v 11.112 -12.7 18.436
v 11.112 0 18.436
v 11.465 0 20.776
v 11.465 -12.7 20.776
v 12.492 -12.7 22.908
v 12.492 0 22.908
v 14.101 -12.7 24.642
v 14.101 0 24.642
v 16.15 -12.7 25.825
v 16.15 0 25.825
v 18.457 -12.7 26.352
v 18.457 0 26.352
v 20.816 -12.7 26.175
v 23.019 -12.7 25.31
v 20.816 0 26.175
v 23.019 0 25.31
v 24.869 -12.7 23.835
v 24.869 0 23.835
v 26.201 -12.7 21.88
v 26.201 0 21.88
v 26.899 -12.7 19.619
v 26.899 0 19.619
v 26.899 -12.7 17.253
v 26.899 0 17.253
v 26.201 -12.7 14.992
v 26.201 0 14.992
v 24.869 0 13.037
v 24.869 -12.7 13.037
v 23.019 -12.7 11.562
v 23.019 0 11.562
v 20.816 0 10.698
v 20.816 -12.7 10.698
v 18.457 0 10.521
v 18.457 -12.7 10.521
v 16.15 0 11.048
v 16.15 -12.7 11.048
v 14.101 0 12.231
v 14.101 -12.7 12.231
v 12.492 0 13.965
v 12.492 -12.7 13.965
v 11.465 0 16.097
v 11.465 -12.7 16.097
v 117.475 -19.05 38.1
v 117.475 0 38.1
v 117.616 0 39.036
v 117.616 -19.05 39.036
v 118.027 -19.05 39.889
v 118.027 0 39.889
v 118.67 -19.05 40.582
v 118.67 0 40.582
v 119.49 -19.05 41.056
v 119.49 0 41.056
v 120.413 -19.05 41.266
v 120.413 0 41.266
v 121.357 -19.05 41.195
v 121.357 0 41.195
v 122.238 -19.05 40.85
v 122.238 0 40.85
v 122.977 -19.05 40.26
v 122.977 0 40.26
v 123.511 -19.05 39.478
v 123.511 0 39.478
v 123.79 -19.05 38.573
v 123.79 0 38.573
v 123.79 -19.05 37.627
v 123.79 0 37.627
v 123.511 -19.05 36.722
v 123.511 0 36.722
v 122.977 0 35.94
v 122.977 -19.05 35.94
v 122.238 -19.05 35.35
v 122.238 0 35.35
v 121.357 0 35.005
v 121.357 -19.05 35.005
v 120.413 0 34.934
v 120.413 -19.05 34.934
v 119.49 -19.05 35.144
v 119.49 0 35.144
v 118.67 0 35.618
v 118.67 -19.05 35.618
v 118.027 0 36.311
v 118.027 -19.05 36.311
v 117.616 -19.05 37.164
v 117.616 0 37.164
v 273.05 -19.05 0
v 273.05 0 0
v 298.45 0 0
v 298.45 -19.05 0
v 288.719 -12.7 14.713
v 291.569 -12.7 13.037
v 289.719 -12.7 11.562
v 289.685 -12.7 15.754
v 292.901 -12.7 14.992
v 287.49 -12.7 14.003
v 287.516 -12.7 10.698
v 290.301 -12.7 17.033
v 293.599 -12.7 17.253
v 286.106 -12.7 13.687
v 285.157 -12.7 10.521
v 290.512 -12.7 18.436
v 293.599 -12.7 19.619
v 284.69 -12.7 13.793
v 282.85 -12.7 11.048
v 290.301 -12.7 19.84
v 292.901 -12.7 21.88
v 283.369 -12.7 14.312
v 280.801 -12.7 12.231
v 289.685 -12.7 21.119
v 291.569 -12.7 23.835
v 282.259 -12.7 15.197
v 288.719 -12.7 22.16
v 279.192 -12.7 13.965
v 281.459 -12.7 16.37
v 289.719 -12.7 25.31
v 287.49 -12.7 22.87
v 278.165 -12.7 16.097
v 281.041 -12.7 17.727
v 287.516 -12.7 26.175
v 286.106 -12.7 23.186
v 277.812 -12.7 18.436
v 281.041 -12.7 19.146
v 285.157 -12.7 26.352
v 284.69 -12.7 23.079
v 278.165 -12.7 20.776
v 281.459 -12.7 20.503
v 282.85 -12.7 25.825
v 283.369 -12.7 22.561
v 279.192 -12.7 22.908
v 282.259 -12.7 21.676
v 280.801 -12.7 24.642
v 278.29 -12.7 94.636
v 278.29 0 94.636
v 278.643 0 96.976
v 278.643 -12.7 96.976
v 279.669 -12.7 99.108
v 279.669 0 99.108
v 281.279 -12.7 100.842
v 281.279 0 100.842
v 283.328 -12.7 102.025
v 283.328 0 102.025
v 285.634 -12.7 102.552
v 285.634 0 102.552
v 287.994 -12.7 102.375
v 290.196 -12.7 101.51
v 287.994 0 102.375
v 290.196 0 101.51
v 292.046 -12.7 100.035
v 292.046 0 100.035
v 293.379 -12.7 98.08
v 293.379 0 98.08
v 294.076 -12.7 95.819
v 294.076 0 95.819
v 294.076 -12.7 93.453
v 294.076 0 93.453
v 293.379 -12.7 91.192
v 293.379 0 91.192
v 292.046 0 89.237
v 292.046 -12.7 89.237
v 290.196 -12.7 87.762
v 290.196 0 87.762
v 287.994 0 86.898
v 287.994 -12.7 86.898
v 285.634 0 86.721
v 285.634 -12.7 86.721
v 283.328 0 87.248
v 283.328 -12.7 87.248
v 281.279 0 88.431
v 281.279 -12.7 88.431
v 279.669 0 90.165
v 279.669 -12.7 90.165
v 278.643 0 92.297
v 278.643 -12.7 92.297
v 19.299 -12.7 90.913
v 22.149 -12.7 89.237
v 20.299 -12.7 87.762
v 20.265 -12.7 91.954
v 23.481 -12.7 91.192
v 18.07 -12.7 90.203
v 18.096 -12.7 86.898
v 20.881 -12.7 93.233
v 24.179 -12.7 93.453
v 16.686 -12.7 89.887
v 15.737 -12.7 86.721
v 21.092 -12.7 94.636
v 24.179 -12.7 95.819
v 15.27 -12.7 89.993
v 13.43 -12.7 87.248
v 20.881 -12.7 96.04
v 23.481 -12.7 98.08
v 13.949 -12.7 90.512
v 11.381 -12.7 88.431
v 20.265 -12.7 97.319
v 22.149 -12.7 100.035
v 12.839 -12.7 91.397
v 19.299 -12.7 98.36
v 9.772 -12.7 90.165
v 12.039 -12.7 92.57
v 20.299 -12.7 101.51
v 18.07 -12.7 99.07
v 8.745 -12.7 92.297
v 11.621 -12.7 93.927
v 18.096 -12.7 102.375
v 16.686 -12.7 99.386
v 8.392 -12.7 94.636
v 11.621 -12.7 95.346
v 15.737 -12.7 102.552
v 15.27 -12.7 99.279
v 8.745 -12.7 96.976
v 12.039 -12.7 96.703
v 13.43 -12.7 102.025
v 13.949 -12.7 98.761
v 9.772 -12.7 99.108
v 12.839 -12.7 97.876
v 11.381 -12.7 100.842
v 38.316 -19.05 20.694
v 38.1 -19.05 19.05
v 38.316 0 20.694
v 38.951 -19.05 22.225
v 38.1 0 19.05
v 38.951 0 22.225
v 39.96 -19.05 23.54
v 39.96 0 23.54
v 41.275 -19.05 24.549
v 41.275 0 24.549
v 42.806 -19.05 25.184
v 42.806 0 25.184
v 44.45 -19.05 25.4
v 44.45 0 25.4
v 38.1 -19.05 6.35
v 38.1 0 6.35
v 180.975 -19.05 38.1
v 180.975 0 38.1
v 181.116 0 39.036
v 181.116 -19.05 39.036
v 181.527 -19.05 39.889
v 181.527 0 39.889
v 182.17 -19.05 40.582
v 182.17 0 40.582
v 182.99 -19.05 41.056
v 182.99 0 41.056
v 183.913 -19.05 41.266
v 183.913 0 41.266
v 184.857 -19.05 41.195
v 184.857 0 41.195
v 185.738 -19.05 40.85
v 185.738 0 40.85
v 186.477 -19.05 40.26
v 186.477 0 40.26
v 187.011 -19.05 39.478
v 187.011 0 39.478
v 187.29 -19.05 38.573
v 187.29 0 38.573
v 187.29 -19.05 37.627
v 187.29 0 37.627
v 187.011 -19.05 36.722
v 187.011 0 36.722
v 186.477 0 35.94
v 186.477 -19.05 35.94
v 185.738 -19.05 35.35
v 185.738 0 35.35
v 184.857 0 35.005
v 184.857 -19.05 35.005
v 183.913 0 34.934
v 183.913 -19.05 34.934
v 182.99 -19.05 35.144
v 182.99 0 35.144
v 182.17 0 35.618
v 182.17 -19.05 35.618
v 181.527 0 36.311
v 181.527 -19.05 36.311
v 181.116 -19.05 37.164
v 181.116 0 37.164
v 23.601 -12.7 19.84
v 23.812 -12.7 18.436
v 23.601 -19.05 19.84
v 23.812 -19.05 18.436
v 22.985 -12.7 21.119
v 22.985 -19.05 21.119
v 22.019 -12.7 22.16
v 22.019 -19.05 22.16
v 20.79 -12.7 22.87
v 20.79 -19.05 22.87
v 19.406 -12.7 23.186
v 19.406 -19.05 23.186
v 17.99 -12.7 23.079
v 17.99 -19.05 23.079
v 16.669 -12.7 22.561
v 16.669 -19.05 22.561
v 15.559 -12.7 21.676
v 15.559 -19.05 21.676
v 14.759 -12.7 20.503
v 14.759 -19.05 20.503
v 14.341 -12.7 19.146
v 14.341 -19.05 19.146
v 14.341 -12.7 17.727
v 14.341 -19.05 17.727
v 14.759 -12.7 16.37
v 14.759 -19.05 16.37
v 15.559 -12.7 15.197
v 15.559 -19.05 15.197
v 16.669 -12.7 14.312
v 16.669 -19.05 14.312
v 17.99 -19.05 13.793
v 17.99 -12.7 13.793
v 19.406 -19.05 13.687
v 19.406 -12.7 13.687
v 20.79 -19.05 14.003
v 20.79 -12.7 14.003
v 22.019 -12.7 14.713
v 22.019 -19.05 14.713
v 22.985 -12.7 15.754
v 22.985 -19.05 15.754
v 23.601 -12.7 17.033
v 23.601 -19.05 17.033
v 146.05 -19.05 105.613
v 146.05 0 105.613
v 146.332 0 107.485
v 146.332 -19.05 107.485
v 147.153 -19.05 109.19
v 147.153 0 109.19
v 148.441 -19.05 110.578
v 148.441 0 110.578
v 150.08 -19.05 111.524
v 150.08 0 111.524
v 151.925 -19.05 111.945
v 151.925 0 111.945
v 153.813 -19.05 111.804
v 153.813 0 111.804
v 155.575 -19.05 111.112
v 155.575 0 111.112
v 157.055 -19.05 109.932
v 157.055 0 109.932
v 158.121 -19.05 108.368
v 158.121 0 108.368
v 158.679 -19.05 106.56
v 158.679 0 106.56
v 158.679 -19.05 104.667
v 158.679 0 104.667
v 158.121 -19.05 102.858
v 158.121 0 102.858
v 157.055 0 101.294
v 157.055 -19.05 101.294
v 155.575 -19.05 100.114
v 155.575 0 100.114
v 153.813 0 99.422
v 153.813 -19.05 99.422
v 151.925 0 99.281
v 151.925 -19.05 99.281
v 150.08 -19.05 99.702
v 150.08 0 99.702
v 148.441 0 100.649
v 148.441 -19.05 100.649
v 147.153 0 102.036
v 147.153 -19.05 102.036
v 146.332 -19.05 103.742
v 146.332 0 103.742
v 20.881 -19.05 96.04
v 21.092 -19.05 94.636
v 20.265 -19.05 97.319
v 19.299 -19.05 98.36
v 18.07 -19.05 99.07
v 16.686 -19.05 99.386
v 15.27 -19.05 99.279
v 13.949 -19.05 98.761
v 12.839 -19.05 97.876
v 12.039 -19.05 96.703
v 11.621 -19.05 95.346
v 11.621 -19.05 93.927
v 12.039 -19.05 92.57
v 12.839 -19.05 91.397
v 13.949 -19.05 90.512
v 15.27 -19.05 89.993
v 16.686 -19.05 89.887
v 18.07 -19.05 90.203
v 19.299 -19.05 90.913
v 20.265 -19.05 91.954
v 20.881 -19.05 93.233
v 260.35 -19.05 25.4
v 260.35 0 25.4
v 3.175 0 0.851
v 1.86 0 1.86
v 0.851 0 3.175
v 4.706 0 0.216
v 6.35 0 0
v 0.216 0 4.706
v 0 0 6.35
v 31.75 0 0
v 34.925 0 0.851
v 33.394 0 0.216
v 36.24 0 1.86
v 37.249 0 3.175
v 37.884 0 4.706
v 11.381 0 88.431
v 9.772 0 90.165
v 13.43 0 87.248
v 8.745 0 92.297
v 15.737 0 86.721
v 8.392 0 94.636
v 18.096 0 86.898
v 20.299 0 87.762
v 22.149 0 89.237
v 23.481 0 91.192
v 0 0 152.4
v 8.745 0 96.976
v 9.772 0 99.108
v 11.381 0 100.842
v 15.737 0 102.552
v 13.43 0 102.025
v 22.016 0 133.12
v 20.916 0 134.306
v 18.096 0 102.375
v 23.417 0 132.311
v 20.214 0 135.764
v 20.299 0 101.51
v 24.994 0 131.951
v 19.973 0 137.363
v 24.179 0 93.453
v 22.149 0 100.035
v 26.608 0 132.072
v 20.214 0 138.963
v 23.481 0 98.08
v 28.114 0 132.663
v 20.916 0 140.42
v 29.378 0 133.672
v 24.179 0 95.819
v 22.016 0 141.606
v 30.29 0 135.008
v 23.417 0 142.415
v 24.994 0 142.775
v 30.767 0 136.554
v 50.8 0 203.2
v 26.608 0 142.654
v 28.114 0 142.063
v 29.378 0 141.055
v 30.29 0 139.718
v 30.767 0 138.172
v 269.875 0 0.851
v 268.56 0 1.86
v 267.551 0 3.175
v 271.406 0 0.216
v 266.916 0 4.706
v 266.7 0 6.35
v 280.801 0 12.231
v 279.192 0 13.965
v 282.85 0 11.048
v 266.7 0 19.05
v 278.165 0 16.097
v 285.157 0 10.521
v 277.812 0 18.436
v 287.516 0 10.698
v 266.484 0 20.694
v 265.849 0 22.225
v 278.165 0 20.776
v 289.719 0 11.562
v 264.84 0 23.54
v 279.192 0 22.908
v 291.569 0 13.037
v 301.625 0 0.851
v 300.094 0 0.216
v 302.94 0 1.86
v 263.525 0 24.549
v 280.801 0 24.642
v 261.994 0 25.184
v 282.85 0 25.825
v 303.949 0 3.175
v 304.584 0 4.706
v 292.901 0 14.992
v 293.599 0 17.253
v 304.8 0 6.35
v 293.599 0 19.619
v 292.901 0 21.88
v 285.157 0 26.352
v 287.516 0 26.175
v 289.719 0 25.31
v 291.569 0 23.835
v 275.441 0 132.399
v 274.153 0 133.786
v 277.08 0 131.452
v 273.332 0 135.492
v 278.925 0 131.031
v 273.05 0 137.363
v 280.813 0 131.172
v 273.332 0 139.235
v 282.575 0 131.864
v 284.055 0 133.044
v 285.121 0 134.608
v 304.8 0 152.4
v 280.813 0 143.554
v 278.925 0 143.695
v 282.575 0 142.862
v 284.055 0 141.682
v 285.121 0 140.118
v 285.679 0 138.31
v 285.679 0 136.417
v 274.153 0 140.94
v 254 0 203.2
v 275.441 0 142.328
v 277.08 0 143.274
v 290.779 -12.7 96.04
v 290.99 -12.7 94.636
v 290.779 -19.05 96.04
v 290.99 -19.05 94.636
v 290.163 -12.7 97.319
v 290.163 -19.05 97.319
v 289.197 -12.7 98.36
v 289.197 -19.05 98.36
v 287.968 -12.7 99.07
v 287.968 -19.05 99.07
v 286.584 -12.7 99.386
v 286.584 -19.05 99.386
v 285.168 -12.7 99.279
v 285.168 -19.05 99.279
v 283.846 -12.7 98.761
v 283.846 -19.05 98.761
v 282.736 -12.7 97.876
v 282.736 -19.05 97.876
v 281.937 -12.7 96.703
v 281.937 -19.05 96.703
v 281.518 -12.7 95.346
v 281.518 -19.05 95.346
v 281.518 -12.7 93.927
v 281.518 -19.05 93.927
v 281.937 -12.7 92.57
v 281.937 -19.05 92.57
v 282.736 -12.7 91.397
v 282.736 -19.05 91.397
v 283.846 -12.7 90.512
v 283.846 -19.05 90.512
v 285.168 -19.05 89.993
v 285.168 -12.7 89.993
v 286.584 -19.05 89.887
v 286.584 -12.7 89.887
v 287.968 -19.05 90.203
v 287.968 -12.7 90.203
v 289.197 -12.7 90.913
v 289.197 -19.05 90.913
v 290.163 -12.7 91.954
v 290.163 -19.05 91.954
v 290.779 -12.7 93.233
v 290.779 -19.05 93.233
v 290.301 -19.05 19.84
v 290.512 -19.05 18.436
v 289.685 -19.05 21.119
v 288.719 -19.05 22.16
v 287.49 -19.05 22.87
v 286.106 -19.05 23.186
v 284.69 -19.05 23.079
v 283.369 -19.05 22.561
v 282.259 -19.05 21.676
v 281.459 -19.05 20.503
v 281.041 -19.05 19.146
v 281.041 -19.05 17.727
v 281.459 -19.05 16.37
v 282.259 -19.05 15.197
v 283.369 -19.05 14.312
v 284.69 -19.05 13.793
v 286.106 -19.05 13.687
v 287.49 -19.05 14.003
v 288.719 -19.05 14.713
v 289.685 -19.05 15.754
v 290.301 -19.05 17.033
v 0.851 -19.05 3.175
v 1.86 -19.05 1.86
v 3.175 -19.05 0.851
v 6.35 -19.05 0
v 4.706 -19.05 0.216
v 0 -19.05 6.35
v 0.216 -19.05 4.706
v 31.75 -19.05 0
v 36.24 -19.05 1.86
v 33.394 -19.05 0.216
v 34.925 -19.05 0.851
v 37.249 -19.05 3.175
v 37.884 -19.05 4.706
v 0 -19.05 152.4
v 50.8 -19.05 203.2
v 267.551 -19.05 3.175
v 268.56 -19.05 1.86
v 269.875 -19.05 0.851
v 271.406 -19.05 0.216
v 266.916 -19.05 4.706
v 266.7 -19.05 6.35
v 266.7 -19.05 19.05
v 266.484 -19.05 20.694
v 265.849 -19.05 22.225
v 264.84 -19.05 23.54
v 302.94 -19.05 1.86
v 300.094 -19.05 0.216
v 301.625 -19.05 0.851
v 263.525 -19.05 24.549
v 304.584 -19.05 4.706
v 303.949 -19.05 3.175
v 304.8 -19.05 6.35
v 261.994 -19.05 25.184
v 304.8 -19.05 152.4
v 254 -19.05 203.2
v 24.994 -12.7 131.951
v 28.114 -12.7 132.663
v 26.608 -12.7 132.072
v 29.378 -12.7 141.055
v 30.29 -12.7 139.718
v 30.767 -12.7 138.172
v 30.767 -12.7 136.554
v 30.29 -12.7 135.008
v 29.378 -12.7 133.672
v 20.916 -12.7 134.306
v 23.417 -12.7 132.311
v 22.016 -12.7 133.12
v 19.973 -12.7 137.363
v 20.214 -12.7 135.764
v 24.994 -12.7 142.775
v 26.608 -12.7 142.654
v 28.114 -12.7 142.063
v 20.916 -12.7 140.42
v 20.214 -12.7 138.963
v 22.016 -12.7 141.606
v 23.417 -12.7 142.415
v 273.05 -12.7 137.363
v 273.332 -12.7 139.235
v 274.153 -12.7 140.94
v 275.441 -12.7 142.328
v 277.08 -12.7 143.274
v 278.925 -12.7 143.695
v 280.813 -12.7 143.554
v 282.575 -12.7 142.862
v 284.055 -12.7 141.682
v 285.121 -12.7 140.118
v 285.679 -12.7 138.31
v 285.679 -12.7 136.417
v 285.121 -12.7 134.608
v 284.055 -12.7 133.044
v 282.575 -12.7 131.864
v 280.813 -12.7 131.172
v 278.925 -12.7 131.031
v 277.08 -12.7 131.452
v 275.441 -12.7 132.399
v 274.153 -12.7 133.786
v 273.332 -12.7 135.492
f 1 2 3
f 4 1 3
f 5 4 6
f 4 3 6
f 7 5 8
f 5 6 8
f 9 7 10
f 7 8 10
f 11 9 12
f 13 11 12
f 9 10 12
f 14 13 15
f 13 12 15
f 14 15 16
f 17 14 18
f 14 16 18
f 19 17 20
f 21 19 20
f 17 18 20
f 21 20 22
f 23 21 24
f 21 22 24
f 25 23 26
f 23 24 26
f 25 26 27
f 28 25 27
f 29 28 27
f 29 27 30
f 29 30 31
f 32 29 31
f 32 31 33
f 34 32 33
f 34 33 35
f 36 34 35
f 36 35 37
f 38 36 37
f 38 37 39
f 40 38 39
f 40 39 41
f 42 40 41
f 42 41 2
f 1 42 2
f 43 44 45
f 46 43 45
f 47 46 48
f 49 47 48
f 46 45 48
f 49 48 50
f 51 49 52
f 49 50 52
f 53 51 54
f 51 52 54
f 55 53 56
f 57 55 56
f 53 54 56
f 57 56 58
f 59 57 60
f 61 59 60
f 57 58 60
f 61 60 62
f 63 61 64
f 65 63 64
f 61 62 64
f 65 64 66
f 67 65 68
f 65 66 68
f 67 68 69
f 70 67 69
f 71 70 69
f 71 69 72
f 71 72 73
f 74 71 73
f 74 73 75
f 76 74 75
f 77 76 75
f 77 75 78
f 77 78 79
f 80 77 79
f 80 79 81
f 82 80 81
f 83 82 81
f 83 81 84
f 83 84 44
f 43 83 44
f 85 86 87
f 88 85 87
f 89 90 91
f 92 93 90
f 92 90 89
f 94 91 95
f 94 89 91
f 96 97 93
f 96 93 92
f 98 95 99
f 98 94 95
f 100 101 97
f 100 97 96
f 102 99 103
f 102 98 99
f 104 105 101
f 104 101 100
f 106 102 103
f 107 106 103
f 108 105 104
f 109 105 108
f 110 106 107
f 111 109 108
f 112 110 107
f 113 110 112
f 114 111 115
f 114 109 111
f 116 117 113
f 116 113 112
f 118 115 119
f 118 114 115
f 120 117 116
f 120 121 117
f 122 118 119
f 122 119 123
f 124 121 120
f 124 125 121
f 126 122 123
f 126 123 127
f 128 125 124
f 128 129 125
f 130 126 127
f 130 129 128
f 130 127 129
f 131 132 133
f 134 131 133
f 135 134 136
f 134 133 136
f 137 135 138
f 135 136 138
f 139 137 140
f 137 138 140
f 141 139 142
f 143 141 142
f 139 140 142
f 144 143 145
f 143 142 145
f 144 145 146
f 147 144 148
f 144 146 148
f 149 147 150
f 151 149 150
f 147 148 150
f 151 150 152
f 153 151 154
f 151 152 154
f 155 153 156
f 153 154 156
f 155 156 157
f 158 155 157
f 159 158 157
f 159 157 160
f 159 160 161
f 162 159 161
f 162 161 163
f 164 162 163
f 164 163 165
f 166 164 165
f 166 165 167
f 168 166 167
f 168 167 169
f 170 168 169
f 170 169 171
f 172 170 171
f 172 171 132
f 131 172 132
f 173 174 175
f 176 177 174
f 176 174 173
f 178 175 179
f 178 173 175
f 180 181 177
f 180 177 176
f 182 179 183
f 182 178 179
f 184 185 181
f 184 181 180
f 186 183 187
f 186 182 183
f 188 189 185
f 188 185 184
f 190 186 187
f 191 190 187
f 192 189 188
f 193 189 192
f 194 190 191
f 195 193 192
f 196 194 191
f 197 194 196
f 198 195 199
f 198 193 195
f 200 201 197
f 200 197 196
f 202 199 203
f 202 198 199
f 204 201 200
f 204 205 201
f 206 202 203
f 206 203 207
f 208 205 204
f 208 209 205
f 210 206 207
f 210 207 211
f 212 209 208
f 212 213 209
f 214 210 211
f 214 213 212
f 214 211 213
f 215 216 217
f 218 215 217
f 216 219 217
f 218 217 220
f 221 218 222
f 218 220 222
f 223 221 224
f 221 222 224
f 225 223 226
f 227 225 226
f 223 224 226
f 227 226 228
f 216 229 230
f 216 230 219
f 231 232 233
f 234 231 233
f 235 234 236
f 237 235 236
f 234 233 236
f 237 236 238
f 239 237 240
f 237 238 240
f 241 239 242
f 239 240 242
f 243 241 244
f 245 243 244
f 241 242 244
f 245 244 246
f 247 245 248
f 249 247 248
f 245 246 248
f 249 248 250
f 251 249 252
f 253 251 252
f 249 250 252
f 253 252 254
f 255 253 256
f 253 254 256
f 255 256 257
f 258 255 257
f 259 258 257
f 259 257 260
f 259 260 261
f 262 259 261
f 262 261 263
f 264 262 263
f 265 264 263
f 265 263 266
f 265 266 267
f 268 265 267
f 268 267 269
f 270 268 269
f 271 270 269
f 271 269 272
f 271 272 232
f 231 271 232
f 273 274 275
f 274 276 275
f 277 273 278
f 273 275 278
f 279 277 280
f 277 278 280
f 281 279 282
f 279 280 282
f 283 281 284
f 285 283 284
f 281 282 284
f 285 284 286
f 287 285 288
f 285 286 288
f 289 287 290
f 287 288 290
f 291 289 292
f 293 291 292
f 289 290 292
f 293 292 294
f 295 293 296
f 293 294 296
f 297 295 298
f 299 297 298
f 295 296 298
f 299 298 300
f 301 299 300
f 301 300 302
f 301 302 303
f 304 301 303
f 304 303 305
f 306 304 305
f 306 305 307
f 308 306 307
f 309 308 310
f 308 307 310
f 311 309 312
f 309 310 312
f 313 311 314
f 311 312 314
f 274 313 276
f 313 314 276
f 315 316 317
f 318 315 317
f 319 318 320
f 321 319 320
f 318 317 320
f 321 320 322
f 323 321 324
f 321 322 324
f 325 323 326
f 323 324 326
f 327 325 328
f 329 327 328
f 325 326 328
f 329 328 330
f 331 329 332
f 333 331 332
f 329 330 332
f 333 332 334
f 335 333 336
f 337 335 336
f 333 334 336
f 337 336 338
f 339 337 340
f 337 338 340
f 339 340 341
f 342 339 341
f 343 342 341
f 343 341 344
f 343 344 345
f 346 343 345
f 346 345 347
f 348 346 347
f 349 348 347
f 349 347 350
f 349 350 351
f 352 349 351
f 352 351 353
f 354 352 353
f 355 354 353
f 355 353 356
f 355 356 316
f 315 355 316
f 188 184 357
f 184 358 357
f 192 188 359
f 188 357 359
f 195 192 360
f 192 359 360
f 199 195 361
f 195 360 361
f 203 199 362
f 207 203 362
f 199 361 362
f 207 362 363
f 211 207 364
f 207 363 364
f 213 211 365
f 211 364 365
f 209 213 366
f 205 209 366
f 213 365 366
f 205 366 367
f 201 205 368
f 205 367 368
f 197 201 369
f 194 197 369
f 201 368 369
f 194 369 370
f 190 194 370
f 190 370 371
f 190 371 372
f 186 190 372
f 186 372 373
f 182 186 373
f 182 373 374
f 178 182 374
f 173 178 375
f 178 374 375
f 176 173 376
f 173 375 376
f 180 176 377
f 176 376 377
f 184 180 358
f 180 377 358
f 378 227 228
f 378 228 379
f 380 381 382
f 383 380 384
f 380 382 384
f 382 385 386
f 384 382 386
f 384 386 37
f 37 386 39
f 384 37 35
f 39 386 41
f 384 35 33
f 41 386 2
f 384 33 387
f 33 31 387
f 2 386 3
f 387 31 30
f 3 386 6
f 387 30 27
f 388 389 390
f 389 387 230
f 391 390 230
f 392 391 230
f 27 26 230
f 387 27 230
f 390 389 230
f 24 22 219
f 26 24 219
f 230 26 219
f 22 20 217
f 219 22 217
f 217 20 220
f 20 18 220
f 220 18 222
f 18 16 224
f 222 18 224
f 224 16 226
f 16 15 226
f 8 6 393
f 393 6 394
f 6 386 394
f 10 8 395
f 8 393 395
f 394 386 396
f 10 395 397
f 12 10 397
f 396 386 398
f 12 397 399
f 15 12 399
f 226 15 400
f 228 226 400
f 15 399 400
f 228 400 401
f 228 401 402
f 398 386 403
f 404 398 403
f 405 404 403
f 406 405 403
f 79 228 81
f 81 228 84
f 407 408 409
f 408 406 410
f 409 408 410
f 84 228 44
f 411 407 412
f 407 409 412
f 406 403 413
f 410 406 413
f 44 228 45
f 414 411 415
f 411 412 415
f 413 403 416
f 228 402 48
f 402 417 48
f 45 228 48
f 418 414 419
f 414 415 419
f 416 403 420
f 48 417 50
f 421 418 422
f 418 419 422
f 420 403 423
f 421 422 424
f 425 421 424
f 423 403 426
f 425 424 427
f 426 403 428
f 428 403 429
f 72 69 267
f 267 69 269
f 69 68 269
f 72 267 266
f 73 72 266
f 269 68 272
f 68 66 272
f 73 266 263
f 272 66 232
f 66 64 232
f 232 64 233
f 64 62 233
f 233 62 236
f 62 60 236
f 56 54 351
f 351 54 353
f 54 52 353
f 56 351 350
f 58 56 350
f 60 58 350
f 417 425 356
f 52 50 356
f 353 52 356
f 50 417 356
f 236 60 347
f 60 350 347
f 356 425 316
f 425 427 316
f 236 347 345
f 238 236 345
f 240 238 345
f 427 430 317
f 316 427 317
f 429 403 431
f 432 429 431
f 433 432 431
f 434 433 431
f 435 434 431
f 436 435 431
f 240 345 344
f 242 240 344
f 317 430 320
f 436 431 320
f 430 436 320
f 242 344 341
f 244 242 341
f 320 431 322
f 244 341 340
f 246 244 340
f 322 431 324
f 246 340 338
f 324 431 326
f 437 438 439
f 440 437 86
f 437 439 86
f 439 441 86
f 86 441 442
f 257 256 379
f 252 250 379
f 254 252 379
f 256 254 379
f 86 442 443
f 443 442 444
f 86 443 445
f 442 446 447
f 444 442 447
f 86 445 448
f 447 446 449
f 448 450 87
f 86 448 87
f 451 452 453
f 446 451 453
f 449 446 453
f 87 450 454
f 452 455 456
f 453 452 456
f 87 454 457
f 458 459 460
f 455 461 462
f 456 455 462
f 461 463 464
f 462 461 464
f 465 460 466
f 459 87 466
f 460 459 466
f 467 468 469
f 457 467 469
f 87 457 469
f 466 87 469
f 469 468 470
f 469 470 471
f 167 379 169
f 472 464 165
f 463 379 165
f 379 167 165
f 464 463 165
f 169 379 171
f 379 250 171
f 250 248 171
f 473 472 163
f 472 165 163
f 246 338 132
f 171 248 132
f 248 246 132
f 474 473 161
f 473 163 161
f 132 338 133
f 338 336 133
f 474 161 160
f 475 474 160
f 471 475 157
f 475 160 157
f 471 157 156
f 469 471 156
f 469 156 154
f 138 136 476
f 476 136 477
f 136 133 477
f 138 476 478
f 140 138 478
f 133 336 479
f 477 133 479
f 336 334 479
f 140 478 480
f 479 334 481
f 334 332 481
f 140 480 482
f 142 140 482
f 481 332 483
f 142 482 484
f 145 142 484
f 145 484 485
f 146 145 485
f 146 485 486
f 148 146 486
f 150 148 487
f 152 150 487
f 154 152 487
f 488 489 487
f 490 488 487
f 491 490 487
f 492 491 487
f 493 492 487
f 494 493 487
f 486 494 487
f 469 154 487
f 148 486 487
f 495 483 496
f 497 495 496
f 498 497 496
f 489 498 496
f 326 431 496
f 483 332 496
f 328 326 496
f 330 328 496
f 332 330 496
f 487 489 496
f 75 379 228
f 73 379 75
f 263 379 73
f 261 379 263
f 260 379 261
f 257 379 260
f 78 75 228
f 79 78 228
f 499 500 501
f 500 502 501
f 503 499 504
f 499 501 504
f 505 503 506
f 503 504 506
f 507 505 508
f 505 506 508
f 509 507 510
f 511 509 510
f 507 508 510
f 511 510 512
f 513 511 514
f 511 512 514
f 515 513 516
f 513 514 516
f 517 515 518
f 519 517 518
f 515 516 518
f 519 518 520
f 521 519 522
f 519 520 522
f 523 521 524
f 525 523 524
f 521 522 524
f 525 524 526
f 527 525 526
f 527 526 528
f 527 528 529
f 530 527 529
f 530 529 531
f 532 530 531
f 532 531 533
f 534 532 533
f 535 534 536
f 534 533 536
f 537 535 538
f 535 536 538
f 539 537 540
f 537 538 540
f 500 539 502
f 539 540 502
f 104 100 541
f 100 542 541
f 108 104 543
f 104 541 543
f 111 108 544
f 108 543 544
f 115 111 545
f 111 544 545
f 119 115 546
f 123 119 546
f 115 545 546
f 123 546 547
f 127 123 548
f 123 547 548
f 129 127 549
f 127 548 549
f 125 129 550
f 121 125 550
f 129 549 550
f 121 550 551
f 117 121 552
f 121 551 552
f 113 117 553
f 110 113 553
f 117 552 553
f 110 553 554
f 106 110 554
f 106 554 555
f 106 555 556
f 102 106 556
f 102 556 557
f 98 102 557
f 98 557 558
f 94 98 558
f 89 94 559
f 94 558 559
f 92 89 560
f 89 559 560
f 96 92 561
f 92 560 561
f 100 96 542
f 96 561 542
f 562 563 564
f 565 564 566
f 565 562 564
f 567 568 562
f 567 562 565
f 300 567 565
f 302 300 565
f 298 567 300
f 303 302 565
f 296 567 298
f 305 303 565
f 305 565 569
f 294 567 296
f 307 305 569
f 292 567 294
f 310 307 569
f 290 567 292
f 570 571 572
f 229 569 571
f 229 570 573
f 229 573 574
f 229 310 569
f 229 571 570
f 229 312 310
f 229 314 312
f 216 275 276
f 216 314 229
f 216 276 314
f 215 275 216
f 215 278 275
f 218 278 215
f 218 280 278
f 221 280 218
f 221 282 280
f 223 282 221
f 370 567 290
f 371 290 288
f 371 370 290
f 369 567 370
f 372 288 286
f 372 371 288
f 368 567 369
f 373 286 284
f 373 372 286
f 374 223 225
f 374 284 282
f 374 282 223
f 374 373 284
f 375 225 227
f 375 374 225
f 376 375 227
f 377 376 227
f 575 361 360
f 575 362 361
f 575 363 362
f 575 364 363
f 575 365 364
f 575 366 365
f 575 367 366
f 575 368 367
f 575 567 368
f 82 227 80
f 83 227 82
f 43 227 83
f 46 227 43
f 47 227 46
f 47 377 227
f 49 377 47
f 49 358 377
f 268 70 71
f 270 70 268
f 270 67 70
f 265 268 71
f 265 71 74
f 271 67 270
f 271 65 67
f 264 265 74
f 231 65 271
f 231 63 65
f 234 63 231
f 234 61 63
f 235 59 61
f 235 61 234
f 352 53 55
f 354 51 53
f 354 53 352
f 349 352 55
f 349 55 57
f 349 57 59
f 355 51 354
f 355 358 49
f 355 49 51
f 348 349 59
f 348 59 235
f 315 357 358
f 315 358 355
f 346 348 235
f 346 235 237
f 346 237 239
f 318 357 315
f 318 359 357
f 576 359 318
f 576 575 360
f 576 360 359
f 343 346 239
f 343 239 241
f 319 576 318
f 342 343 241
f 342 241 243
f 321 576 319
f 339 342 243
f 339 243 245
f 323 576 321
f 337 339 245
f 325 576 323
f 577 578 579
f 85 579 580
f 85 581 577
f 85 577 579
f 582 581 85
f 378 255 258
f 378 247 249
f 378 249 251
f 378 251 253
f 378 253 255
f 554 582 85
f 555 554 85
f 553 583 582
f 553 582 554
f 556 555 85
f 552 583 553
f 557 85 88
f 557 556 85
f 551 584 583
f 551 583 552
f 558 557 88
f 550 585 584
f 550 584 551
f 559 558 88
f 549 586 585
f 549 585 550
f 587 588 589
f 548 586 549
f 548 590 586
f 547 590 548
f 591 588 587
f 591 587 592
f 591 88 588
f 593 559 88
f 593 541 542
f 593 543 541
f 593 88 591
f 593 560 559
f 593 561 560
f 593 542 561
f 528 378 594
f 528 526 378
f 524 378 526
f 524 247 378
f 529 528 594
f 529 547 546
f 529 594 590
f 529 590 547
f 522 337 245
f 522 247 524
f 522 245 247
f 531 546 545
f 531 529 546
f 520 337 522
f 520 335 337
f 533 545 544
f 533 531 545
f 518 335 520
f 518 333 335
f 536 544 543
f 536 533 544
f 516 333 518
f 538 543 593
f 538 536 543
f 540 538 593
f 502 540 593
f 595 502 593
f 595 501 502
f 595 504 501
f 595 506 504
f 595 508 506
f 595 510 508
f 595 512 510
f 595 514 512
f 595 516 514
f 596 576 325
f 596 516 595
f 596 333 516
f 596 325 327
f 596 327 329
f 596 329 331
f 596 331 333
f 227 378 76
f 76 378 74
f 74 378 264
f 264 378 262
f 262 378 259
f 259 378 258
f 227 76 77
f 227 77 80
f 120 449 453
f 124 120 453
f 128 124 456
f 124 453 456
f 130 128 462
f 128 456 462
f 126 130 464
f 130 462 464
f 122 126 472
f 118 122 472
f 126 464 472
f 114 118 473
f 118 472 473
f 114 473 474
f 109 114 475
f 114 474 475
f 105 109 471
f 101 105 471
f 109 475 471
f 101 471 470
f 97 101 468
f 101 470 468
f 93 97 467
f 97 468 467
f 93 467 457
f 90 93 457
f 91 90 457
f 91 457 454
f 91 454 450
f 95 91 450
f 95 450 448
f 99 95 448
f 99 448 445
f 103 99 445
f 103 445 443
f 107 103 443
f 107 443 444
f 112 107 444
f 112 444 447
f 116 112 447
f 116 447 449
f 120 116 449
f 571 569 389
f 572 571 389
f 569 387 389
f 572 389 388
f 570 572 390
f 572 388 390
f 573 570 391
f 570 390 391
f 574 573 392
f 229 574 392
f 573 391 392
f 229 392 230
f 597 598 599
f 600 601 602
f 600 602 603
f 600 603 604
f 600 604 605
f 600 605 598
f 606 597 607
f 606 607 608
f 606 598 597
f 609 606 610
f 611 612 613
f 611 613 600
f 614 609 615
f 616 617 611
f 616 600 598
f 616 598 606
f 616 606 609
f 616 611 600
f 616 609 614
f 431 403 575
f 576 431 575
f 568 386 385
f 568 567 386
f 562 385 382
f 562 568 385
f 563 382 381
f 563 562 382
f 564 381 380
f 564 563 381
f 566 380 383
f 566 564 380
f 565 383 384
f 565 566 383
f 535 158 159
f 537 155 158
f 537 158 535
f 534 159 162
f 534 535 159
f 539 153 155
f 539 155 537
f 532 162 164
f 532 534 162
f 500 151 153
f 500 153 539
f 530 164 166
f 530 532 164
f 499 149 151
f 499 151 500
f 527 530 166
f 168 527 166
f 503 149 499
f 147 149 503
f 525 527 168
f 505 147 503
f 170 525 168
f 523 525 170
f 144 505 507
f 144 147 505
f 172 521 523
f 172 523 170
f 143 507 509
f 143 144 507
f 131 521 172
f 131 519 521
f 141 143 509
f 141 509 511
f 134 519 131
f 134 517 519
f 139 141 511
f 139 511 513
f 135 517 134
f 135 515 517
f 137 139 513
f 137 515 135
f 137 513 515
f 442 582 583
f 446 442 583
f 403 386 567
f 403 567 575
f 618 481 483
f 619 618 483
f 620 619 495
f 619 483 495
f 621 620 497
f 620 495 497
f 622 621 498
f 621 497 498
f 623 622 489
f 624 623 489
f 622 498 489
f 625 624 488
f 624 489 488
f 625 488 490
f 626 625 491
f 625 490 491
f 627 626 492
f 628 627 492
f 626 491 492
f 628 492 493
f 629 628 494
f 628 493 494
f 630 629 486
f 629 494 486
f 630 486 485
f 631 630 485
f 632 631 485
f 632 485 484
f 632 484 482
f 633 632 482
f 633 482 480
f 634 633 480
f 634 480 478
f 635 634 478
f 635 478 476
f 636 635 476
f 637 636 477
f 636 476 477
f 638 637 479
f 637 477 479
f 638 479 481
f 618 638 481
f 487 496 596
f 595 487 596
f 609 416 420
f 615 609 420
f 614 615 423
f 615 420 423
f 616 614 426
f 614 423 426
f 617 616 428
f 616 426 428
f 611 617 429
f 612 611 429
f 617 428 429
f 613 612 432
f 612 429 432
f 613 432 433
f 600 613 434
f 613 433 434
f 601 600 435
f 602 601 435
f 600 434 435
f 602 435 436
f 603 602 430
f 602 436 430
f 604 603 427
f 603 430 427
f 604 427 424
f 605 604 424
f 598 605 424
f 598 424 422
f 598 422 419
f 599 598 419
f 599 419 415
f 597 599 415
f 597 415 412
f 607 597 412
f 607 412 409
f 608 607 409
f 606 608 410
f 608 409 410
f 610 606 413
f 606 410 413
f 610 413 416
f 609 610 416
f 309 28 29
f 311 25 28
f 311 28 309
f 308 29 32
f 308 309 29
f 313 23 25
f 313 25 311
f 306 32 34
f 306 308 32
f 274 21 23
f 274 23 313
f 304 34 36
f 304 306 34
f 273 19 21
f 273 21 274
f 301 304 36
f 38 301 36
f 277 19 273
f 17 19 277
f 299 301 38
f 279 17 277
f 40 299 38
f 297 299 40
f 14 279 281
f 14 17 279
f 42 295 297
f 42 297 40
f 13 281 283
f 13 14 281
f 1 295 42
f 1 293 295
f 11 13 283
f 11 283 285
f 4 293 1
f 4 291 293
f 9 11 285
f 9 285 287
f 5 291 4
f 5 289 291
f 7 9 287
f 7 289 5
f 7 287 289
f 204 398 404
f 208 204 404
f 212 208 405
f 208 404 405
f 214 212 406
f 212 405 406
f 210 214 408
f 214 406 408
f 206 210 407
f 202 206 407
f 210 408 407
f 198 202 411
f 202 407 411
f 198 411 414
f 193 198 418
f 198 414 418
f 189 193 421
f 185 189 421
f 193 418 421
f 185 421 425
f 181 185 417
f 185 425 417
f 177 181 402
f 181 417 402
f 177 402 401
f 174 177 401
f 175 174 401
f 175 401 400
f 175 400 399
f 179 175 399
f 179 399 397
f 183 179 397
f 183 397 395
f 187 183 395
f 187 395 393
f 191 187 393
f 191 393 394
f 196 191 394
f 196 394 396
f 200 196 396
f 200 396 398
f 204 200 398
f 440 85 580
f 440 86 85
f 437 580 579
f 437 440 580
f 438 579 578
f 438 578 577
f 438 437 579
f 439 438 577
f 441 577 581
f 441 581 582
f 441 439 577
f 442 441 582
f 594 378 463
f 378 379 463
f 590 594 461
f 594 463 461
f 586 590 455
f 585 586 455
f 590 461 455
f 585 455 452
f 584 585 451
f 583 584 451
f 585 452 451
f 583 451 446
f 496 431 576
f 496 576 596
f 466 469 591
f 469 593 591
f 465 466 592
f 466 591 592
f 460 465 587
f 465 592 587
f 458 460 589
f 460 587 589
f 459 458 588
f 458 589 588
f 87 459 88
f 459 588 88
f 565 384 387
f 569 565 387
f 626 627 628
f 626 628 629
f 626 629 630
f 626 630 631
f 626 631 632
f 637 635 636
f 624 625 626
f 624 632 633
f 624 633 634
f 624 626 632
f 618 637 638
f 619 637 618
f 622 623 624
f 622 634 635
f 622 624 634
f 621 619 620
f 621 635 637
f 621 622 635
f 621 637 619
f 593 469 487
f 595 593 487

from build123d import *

# Parameters (mm, degrees)
F0_W            = 304.8
F0_H            = 203.2
F1_DEPTH        = 19.05
F2_W            = 228.6
F2_H            = 25.4
F3_DEPTH        = 19.051
F5_D            = 6.35
F6_R            = 6.35
F8_D            = 12.7
F9_R            = 5.4271203762
F9_R_2          = 6.35
F10_DEPTH       = 12.7
F12_D           = 9.525
F12_CBORE_D     = 15.875
F12_CBORE_DEPTH = 12.7
F13_SIZE        = 50.8


with BuildPart() as f1:
    # F0 (on Front) → F1 (new body)
    with BuildSketch(Plane.XZ):
        with Locations((152.4, 101.6)):
            Rectangle(F0_W, F0_H)
    extrude(amount=F1_DEPTH)

    # F2 (on face) → F3 (cut, through all)
    with BuildSketch(Plane.XZ.offset(19.05)):
        with Locations((152.4, 12.7)):
            Rectangle(F2_W, F2_H)
    extrude(amount=-F3_DEPTH, mode=Mode.SUBTRACT)

    # F5 (through all)
    with Locations(Plane.XZ.offset(19.05)):
        with Locations((120.65, 38.1), (184.15, 38.1)):
            Hole(F5_D / 2)

    # F6
    f6_edges = [f1.edges().sort_by_distance(p)[0] for p in [
        (38.1, -9.525, 0),
        (38.1, -9.525, 25.4),
        (0, -9.525, 0),
        (266.7, -9.525, 25.4),
        (266.7, -9.525, 0),
        (304.8, -9.525, 0),
    ]]
    fillet(f6_edges, radius=F6_R)

    # F8 (through all)
    with Locations(Plane.XZ.offset(19.05)):
        with Locations((152.4, 105.6132)):
            Hole(F8_D / 2)

    # F9 (on face) → F10 (cut)
    with BuildSketch(Plane(origin=(0, 0, 0), x_dir=(-1, 0, 0), z_dir=(0, 1, 0))):
        with Locations((-25.4, 137.3632)):
            Circle(F9_R)
        with Locations((-279.4, 137.3632)):
            Circle(F9_R_2)
    extrude(amount=-F10_DEPTH, mode=Mode.SUBTRACT)

    # F12 (through all)
    with Locations(Plane(origin=(0, 0, 0), x_dir=(-1, 0, 0), z_dir=(0, 1, 0))):
        with Locations((-286.227653817, 94.6363272378), (-285.75, 18.4363272378), (-19.05, 18.4363272378), (-16.3299310523, 94.6363272378)):
            CounterBoreHole(F12_D / 2, F12_CBORE_D / 2, F12_CBORE_DEPTH)

    # F13
    f13_edges = [f1.edges().sort_by_distance(p)[0] for p in [
        (304.8, -9.525, 203.2),
        (0, -9.525, 203.2),
    ]]
    chamfer(f13_edges, length=F13_SIZE)


solid = f1.part
